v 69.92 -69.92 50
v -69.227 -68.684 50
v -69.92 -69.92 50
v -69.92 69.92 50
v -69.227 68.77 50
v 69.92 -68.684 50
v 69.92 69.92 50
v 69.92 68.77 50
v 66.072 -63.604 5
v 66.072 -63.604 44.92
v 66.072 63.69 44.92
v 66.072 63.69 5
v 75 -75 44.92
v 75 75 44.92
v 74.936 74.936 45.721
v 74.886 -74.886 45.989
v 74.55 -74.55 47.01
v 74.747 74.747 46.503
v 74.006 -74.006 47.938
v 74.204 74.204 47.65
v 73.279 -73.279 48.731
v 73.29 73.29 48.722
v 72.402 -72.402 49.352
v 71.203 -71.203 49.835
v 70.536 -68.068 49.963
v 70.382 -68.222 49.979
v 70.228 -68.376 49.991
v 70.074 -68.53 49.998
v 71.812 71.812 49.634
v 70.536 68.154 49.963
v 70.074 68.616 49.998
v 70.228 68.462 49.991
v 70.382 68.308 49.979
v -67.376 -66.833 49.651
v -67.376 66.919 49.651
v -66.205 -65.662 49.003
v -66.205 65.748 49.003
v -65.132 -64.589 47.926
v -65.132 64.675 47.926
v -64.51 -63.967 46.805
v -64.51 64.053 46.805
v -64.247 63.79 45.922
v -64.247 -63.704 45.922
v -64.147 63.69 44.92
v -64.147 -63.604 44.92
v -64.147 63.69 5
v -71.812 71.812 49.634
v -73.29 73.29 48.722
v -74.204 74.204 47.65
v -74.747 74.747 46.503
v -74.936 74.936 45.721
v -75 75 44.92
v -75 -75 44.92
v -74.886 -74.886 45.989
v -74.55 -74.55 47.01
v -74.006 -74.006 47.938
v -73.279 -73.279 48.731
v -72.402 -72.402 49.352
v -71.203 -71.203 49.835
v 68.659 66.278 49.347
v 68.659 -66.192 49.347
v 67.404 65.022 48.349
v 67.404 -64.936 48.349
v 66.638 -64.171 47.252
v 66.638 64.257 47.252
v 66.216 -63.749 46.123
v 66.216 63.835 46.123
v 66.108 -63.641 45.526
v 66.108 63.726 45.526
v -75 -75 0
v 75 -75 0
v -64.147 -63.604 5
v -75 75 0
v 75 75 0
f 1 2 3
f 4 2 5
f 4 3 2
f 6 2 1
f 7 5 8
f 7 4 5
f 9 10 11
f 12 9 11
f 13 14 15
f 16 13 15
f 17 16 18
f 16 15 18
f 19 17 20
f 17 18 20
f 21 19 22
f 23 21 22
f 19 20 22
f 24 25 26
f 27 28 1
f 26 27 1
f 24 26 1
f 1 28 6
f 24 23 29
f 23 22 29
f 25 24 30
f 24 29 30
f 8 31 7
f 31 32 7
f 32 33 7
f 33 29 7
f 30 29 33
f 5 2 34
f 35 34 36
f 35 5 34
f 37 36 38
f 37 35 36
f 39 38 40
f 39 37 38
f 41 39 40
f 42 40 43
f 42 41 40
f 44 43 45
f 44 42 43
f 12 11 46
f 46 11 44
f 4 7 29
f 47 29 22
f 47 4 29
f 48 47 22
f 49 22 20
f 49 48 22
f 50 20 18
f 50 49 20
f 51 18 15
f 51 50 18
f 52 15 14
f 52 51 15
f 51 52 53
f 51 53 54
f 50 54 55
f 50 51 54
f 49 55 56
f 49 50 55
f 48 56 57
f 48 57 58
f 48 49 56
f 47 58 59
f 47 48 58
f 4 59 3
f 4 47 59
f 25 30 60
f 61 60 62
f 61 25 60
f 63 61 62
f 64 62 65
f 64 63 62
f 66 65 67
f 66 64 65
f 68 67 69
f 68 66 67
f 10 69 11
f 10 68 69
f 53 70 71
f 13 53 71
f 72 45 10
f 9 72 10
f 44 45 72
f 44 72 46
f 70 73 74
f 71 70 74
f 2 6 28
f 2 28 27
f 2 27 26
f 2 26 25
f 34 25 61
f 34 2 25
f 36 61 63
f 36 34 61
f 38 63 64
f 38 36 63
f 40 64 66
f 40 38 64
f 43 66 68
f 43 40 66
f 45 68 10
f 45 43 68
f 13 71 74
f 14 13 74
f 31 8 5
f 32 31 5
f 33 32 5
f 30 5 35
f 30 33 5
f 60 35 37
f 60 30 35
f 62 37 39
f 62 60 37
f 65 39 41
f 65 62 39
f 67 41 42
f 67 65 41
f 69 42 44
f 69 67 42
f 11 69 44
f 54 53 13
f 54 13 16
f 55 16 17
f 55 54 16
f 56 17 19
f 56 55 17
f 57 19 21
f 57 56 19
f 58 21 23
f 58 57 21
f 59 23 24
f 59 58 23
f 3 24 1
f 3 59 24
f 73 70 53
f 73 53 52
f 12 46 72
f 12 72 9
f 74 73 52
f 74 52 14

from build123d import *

# Parameters (mm, degrees)
F0_W         = 150
F0_H         = 150
F1_DEPTH     = 50
F2_W         = 130.2189305425
F2_H         = 127.2944062948
F3_DEPTH     = 45
F4_T1_DEPTH  = 175.4
F4_T3_DEPTH  = 175.4
F4_T5_DEPTH  = 127.2944062948
F4_T7_DEPTH  = 130.2189305425
F4_T13_DEPTH = 142.9189305425
F4_T17_DEPTH = 139.9944062948
F4_T24_DEPTH = 139.9944062948
F4_T28_DEPTH = 142.9189305425
F4_T35_DEPTH = 139.9944062948
F4_T39_DEPTH = 142.9189305425
F4_T46_DEPTH = 139.9944062948
F4_T50_DEPTH = 142.9189305425


# Not quite as in the source:
# - a fillet or chamfer that OpenCascade refuses, or shapes differently, is made with other operations: its cross-section is extruded or revolved along the edge and cut away or added


with BuildPart() as f1:
    # F0 (on Top) → F1 (new body)
    with BuildSketch(Plane.XY):
        Rectangle(F0_W, F0_H)
    extrude(amount=F1_DEPTH)

    # F2 (on face) → F3 (cut)
    with BuildSketch(Plane.XY.offset(50)):
        with Locations((0.9621791542, 0.0429600477)):
            Rectangle(F2_W, F2_H)
    extrude(amount=-F3_DEPTH, mode=Mode.SUBTRACT)

    # F4: fillet of radius 5.08 on 8 edges, made by hand

    # F4_s2 → F4_t1 (cut)
    with BuildSketch(Plane.YZ.offset(-87.7)):
        with BuildLine():
            ThreePointArc((69.92, 50), (73.5121024484, 48.5121024484), (75, 44.92))
            Line((75, 44.92), (75, 50))
            Line((75, 50), (69.92, 50))
        make_face()
        with BuildLine():
            ThreePointArc((-75, 44.92), (-73.5121024484, 48.5121024484), (-69.92, 50))
            Line((-69.92, 50), (-75, 50))
            Line((-75, 50), (-75, 44.92))
        make_face()
    extrude(amount=F4_T1_DEPTH, mode=Mode.SUBTRACT)

    # F4_s4 → F4_t3 (cut)
    with BuildSketch(Plane.XZ.offset(-87.7)):
        with BuildLine():
            ThreePointArc((-75, 44.92), (-73.5121024484, 48.5121024484), (-69.92, 50))
            Line((-69.92, 50), (-75, 50))
            Line((-75, 50), (-75, 44.92))
        make_face()
        with BuildLine():
            ThreePointArc((75, 44.92), (73.5121024484, 48.5121024484), (69.92, 50))
            Line((69.92, 50), (75, 50))
            Line((75, 50), (75, 44.92))
        make_face()
    extrude(amount=F4_T3_DEPTH, mode=Mode.SUBTRACT)

    # F4_s6 → F4_t5 (cut)
    with BuildSketch(Plane.XZ.offset(-63.6901631951)):
        with BuildLine():
            ThreePointArc((71.1516444254, 50), (67.559541977, 48.5121024484), (66.0716444254, 44.92))
            Line((66.0716444254, 44.92), (66.0716444254, 50))
            Line((66.0716444254, 50), (71.1516444254, 50))
        make_face()
        with BuildLine():
            ThreePointArc((-69.2272861171, 50), (-65.6351836686, 48.5121024484), (-64.1472861171, 44.92))
            Line((-64.1472861171, 44.92), (-64.1472861171, 50))
            Line((-64.1472861171, 50), (-69.2272861171, 50))
        make_face()
    extrude(amount=F4_T5_DEPTH, mode=Mode.SUBTRACT)

    # F4_s8 → F4_t7 (cut)
    with BuildSketch(Plane.YZ.offset(-64.1472861171)):
        with BuildLine():
            ThreePointArc((-68.6842430997, 50), (-65.0921406513, 48.5121024484), (-63.6042430997, 44.92))
            Line((-63.6042430997, 44.92), (-63.6042430997, 50))
            Line((-63.6042430997, 50), (-68.6842430997, 50))
        make_face()
        with BuildLine():
            ThreePointArc((68.7701631951, 50), (65.1780607467, 48.5121024484), (63.6901631951, 44.92))
            Line((63.6901631951, 44.92), (63.6901631951, 50))
            Line((63.6901631951, 50), (68.7701631951, 50))
        make_face()
    extrude(amount=F4_T7_DEPTH, mode=Mode.SUBTRACT)


with BuildPart() as f4_tool11:
    # F4_s12 → F4_t13 (new body)
    with BuildSketch(Plane.YZ.offset(-64.1472861171)):
        with BuildLine():
            ThreePointArc((-68.6842430997, 50), (-65.0921406513, 48.5121024484), (-63.6042430997, 44.92))
            Line((-63.6042430997, 44.92), (-63.6042430997, 50))
            Line((-63.6042430997, 50), (-68.6842430997, 50))
        make_face()
    extrude(amount=F4_T13_DEPTH)

    split(bisect_by=Plane.YZ.offset(66.0716444254), keep=Keep.TOP)


with BuildPart() as f4_tool15:
    # F4_s16 → F4_t17 (new body)
    with BuildSketch(Plane.XZ.offset(76.3042430997)):
        with BuildLine():
            ThreePointArc((71.1516444254, 50), (67.559541977, 48.5121024484), (66.0716444254, 44.92))
            Line((66.0716444254, 44.92), (66.0716444254, 50))
            Line((66.0716444254, 50), (71.1516444254, 50))
        make_face()
    extrude(amount=-F4_T17_DEPTH)

    split(bisect_by=Plane.XZ.offset(63.6042430997), keep=Keep.TOP)


with BuildPart() as f4_tool11_1:
    add(f4_tool11.part)

    # F4_t19: intersect F4_tool15
    add(f4_tool15.part, mode=Mode.INTERSECT)


with BuildPart() as f1_1:
    add(f1.part)

    # F4_t9: cut F4_tool11
    add(f4_tool11_1.part, mode=Mode.SUBTRACT)


with BuildPart() as f4_tool22:
    # F4_s23 → F4_t24 (new body)
    with BuildSketch(Plane.XZ.offset(63.6042430997)):
        with BuildLine():
            ThreePointArc((71.1516444254, 50), (67.559541977, 48.5121024484), (66.0716444254, 44.92))
            Line((66.0716444254, 44.92), (66.0716444254, 50))
            Line((66.0716444254, 50), (71.1516444254, 50))
        make_face()
    extrude(amount=-F4_T24_DEPTH)

    split(bisect_by=Plane.XZ.offset(-63.6901631951), keep=Keep.BOTTOM)


with BuildPart() as f4_tool26:
    # F4_s27 → F4_t28 (new body)
    with BuildSketch(Plane.YZ.offset(78.7716444254)):
        with BuildLine():
            ThreePointArc((68.7701631951, 50), (65.1780607467, 48.5121024484), (63.6901631951, 44.92))
            Line((63.6901631951, 44.92), (63.6901631951, 50))
            Line((63.6901631951, 50), (68.7701631951, 50))
        make_face()
    extrude(amount=-F4_T28_DEPTH)

    split(bisect_by=Plane.YZ.offset(66.0716444254), keep=Keep.TOP)


with BuildPart() as f4_tool22_1:
    add(f4_tool22.part)

    # F4_t30: intersect F4_tool26
    add(f4_tool26.part, mode=Mode.INTERSECT)


with BuildPart() as f1_2:
    add(f1_1.part)

    # F4_t20: cut F4_tool22
    add(f4_tool22_1.part, mode=Mode.SUBTRACT)


with BuildPart() as f4_tool33:
    # F4_s34 → F4_t35 (new body)
    with BuildSketch(Plane.XZ.offset(-63.6901631951)):
        with BuildLine():
            ThreePointArc((-69.2272861171, 50), (-65.6351836686, 48.5121024484), (-64.1472861171, 44.92))
            Line((-64.1472861171, 44.92), (-64.1472861171, 50))
            Line((-64.1472861171, 50), (-69.2272861171, 50))
        make_face()
    extrude(amount=F4_T35_DEPTH)

    split(bisect_by=Plane.XZ.offset(63.6042430997), keep=Keep.TOP)


with BuildPart() as f4_tool37:
    # F4_s38 → F4_t39 (new body)
    with BuildSketch(Plane.YZ.offset(-76.8472861171)):
        with BuildLine():
            ThreePointArc((-68.6842430997, 50), (-65.0921406513, 48.5121024484), (-63.6042430997, 44.92))
            Line((-63.6042430997, 44.92), (-63.6042430997, 50))
            Line((-63.6042430997, 50), (-68.6842430997, 50))
        make_face()
    extrude(amount=F4_T39_DEPTH)

    split(bisect_by=Plane.YZ.offset(-64.1472861171), keep=Keep.BOTTOM)


with BuildPart() as f4_tool33_1:
    add(f4_tool33.part)

    # F4_t41: intersect F4_tool37
    add(f4_tool37.part, mode=Mode.INTERSECT)


with BuildPart() as f1_3:
    add(f1_2.part)

    # F4_t31: cut F4_tool33
    add(f4_tool33_1.part, mode=Mode.SUBTRACT)


with BuildPart() as f4_tool44:
    # F4_s45 → F4_t46 (new body)
    with BuildSketch(Plane.XZ.offset(-76.3901631951)):
        with BuildLine():
            ThreePointArc((-69.2272861171, 50), (-65.6351836686, 48.5121024484), (-64.1472861171, 44.92))
            Line((-64.1472861171, 44.92), (-64.1472861171, 50))
            Line((-64.1472861171, 50), (-69.2272861171, 50))
        make_face()
    extrude(amount=F4_T46_DEPTH)

    split(bisect_by=Plane.XZ.offset(-63.6901631951), keep=Keep.BOTTOM)


with BuildPart() as f4_tool48:
    # F4_s49 → F4_t50 (new body)
    with BuildSketch(Plane.YZ.offset(66.0716444254)):
        with BuildLine():
            ThreePointArc((68.7701631951, 50), (65.1780607467, 48.5121024484), (63.6901631951, 44.92))
            Line((63.6901631951, 44.92), (63.6901631951, 50))
            Line((63.6901631951, 50), (68.7701631951, 50))
        make_face()
    extrude(amount=-F4_T50_DEPTH)

    split(bisect_by=Plane.YZ.offset(-64.1472861171), keep=Keep.BOTTOM)


with BuildPart() as f4_tool44_1:
    add(f4_tool44.part)

    # F4_t52: intersect F4_tool48
    add(f4_tool48.part, mode=Mode.INTERSECT)


with BuildPart() as f1_4:
    add(f1_3.part)

    # F4_t42: cut F4_tool44
    add(f4_tool44_1.part, mode=Mode.SUBTRACT)


solid = f1_4.part
